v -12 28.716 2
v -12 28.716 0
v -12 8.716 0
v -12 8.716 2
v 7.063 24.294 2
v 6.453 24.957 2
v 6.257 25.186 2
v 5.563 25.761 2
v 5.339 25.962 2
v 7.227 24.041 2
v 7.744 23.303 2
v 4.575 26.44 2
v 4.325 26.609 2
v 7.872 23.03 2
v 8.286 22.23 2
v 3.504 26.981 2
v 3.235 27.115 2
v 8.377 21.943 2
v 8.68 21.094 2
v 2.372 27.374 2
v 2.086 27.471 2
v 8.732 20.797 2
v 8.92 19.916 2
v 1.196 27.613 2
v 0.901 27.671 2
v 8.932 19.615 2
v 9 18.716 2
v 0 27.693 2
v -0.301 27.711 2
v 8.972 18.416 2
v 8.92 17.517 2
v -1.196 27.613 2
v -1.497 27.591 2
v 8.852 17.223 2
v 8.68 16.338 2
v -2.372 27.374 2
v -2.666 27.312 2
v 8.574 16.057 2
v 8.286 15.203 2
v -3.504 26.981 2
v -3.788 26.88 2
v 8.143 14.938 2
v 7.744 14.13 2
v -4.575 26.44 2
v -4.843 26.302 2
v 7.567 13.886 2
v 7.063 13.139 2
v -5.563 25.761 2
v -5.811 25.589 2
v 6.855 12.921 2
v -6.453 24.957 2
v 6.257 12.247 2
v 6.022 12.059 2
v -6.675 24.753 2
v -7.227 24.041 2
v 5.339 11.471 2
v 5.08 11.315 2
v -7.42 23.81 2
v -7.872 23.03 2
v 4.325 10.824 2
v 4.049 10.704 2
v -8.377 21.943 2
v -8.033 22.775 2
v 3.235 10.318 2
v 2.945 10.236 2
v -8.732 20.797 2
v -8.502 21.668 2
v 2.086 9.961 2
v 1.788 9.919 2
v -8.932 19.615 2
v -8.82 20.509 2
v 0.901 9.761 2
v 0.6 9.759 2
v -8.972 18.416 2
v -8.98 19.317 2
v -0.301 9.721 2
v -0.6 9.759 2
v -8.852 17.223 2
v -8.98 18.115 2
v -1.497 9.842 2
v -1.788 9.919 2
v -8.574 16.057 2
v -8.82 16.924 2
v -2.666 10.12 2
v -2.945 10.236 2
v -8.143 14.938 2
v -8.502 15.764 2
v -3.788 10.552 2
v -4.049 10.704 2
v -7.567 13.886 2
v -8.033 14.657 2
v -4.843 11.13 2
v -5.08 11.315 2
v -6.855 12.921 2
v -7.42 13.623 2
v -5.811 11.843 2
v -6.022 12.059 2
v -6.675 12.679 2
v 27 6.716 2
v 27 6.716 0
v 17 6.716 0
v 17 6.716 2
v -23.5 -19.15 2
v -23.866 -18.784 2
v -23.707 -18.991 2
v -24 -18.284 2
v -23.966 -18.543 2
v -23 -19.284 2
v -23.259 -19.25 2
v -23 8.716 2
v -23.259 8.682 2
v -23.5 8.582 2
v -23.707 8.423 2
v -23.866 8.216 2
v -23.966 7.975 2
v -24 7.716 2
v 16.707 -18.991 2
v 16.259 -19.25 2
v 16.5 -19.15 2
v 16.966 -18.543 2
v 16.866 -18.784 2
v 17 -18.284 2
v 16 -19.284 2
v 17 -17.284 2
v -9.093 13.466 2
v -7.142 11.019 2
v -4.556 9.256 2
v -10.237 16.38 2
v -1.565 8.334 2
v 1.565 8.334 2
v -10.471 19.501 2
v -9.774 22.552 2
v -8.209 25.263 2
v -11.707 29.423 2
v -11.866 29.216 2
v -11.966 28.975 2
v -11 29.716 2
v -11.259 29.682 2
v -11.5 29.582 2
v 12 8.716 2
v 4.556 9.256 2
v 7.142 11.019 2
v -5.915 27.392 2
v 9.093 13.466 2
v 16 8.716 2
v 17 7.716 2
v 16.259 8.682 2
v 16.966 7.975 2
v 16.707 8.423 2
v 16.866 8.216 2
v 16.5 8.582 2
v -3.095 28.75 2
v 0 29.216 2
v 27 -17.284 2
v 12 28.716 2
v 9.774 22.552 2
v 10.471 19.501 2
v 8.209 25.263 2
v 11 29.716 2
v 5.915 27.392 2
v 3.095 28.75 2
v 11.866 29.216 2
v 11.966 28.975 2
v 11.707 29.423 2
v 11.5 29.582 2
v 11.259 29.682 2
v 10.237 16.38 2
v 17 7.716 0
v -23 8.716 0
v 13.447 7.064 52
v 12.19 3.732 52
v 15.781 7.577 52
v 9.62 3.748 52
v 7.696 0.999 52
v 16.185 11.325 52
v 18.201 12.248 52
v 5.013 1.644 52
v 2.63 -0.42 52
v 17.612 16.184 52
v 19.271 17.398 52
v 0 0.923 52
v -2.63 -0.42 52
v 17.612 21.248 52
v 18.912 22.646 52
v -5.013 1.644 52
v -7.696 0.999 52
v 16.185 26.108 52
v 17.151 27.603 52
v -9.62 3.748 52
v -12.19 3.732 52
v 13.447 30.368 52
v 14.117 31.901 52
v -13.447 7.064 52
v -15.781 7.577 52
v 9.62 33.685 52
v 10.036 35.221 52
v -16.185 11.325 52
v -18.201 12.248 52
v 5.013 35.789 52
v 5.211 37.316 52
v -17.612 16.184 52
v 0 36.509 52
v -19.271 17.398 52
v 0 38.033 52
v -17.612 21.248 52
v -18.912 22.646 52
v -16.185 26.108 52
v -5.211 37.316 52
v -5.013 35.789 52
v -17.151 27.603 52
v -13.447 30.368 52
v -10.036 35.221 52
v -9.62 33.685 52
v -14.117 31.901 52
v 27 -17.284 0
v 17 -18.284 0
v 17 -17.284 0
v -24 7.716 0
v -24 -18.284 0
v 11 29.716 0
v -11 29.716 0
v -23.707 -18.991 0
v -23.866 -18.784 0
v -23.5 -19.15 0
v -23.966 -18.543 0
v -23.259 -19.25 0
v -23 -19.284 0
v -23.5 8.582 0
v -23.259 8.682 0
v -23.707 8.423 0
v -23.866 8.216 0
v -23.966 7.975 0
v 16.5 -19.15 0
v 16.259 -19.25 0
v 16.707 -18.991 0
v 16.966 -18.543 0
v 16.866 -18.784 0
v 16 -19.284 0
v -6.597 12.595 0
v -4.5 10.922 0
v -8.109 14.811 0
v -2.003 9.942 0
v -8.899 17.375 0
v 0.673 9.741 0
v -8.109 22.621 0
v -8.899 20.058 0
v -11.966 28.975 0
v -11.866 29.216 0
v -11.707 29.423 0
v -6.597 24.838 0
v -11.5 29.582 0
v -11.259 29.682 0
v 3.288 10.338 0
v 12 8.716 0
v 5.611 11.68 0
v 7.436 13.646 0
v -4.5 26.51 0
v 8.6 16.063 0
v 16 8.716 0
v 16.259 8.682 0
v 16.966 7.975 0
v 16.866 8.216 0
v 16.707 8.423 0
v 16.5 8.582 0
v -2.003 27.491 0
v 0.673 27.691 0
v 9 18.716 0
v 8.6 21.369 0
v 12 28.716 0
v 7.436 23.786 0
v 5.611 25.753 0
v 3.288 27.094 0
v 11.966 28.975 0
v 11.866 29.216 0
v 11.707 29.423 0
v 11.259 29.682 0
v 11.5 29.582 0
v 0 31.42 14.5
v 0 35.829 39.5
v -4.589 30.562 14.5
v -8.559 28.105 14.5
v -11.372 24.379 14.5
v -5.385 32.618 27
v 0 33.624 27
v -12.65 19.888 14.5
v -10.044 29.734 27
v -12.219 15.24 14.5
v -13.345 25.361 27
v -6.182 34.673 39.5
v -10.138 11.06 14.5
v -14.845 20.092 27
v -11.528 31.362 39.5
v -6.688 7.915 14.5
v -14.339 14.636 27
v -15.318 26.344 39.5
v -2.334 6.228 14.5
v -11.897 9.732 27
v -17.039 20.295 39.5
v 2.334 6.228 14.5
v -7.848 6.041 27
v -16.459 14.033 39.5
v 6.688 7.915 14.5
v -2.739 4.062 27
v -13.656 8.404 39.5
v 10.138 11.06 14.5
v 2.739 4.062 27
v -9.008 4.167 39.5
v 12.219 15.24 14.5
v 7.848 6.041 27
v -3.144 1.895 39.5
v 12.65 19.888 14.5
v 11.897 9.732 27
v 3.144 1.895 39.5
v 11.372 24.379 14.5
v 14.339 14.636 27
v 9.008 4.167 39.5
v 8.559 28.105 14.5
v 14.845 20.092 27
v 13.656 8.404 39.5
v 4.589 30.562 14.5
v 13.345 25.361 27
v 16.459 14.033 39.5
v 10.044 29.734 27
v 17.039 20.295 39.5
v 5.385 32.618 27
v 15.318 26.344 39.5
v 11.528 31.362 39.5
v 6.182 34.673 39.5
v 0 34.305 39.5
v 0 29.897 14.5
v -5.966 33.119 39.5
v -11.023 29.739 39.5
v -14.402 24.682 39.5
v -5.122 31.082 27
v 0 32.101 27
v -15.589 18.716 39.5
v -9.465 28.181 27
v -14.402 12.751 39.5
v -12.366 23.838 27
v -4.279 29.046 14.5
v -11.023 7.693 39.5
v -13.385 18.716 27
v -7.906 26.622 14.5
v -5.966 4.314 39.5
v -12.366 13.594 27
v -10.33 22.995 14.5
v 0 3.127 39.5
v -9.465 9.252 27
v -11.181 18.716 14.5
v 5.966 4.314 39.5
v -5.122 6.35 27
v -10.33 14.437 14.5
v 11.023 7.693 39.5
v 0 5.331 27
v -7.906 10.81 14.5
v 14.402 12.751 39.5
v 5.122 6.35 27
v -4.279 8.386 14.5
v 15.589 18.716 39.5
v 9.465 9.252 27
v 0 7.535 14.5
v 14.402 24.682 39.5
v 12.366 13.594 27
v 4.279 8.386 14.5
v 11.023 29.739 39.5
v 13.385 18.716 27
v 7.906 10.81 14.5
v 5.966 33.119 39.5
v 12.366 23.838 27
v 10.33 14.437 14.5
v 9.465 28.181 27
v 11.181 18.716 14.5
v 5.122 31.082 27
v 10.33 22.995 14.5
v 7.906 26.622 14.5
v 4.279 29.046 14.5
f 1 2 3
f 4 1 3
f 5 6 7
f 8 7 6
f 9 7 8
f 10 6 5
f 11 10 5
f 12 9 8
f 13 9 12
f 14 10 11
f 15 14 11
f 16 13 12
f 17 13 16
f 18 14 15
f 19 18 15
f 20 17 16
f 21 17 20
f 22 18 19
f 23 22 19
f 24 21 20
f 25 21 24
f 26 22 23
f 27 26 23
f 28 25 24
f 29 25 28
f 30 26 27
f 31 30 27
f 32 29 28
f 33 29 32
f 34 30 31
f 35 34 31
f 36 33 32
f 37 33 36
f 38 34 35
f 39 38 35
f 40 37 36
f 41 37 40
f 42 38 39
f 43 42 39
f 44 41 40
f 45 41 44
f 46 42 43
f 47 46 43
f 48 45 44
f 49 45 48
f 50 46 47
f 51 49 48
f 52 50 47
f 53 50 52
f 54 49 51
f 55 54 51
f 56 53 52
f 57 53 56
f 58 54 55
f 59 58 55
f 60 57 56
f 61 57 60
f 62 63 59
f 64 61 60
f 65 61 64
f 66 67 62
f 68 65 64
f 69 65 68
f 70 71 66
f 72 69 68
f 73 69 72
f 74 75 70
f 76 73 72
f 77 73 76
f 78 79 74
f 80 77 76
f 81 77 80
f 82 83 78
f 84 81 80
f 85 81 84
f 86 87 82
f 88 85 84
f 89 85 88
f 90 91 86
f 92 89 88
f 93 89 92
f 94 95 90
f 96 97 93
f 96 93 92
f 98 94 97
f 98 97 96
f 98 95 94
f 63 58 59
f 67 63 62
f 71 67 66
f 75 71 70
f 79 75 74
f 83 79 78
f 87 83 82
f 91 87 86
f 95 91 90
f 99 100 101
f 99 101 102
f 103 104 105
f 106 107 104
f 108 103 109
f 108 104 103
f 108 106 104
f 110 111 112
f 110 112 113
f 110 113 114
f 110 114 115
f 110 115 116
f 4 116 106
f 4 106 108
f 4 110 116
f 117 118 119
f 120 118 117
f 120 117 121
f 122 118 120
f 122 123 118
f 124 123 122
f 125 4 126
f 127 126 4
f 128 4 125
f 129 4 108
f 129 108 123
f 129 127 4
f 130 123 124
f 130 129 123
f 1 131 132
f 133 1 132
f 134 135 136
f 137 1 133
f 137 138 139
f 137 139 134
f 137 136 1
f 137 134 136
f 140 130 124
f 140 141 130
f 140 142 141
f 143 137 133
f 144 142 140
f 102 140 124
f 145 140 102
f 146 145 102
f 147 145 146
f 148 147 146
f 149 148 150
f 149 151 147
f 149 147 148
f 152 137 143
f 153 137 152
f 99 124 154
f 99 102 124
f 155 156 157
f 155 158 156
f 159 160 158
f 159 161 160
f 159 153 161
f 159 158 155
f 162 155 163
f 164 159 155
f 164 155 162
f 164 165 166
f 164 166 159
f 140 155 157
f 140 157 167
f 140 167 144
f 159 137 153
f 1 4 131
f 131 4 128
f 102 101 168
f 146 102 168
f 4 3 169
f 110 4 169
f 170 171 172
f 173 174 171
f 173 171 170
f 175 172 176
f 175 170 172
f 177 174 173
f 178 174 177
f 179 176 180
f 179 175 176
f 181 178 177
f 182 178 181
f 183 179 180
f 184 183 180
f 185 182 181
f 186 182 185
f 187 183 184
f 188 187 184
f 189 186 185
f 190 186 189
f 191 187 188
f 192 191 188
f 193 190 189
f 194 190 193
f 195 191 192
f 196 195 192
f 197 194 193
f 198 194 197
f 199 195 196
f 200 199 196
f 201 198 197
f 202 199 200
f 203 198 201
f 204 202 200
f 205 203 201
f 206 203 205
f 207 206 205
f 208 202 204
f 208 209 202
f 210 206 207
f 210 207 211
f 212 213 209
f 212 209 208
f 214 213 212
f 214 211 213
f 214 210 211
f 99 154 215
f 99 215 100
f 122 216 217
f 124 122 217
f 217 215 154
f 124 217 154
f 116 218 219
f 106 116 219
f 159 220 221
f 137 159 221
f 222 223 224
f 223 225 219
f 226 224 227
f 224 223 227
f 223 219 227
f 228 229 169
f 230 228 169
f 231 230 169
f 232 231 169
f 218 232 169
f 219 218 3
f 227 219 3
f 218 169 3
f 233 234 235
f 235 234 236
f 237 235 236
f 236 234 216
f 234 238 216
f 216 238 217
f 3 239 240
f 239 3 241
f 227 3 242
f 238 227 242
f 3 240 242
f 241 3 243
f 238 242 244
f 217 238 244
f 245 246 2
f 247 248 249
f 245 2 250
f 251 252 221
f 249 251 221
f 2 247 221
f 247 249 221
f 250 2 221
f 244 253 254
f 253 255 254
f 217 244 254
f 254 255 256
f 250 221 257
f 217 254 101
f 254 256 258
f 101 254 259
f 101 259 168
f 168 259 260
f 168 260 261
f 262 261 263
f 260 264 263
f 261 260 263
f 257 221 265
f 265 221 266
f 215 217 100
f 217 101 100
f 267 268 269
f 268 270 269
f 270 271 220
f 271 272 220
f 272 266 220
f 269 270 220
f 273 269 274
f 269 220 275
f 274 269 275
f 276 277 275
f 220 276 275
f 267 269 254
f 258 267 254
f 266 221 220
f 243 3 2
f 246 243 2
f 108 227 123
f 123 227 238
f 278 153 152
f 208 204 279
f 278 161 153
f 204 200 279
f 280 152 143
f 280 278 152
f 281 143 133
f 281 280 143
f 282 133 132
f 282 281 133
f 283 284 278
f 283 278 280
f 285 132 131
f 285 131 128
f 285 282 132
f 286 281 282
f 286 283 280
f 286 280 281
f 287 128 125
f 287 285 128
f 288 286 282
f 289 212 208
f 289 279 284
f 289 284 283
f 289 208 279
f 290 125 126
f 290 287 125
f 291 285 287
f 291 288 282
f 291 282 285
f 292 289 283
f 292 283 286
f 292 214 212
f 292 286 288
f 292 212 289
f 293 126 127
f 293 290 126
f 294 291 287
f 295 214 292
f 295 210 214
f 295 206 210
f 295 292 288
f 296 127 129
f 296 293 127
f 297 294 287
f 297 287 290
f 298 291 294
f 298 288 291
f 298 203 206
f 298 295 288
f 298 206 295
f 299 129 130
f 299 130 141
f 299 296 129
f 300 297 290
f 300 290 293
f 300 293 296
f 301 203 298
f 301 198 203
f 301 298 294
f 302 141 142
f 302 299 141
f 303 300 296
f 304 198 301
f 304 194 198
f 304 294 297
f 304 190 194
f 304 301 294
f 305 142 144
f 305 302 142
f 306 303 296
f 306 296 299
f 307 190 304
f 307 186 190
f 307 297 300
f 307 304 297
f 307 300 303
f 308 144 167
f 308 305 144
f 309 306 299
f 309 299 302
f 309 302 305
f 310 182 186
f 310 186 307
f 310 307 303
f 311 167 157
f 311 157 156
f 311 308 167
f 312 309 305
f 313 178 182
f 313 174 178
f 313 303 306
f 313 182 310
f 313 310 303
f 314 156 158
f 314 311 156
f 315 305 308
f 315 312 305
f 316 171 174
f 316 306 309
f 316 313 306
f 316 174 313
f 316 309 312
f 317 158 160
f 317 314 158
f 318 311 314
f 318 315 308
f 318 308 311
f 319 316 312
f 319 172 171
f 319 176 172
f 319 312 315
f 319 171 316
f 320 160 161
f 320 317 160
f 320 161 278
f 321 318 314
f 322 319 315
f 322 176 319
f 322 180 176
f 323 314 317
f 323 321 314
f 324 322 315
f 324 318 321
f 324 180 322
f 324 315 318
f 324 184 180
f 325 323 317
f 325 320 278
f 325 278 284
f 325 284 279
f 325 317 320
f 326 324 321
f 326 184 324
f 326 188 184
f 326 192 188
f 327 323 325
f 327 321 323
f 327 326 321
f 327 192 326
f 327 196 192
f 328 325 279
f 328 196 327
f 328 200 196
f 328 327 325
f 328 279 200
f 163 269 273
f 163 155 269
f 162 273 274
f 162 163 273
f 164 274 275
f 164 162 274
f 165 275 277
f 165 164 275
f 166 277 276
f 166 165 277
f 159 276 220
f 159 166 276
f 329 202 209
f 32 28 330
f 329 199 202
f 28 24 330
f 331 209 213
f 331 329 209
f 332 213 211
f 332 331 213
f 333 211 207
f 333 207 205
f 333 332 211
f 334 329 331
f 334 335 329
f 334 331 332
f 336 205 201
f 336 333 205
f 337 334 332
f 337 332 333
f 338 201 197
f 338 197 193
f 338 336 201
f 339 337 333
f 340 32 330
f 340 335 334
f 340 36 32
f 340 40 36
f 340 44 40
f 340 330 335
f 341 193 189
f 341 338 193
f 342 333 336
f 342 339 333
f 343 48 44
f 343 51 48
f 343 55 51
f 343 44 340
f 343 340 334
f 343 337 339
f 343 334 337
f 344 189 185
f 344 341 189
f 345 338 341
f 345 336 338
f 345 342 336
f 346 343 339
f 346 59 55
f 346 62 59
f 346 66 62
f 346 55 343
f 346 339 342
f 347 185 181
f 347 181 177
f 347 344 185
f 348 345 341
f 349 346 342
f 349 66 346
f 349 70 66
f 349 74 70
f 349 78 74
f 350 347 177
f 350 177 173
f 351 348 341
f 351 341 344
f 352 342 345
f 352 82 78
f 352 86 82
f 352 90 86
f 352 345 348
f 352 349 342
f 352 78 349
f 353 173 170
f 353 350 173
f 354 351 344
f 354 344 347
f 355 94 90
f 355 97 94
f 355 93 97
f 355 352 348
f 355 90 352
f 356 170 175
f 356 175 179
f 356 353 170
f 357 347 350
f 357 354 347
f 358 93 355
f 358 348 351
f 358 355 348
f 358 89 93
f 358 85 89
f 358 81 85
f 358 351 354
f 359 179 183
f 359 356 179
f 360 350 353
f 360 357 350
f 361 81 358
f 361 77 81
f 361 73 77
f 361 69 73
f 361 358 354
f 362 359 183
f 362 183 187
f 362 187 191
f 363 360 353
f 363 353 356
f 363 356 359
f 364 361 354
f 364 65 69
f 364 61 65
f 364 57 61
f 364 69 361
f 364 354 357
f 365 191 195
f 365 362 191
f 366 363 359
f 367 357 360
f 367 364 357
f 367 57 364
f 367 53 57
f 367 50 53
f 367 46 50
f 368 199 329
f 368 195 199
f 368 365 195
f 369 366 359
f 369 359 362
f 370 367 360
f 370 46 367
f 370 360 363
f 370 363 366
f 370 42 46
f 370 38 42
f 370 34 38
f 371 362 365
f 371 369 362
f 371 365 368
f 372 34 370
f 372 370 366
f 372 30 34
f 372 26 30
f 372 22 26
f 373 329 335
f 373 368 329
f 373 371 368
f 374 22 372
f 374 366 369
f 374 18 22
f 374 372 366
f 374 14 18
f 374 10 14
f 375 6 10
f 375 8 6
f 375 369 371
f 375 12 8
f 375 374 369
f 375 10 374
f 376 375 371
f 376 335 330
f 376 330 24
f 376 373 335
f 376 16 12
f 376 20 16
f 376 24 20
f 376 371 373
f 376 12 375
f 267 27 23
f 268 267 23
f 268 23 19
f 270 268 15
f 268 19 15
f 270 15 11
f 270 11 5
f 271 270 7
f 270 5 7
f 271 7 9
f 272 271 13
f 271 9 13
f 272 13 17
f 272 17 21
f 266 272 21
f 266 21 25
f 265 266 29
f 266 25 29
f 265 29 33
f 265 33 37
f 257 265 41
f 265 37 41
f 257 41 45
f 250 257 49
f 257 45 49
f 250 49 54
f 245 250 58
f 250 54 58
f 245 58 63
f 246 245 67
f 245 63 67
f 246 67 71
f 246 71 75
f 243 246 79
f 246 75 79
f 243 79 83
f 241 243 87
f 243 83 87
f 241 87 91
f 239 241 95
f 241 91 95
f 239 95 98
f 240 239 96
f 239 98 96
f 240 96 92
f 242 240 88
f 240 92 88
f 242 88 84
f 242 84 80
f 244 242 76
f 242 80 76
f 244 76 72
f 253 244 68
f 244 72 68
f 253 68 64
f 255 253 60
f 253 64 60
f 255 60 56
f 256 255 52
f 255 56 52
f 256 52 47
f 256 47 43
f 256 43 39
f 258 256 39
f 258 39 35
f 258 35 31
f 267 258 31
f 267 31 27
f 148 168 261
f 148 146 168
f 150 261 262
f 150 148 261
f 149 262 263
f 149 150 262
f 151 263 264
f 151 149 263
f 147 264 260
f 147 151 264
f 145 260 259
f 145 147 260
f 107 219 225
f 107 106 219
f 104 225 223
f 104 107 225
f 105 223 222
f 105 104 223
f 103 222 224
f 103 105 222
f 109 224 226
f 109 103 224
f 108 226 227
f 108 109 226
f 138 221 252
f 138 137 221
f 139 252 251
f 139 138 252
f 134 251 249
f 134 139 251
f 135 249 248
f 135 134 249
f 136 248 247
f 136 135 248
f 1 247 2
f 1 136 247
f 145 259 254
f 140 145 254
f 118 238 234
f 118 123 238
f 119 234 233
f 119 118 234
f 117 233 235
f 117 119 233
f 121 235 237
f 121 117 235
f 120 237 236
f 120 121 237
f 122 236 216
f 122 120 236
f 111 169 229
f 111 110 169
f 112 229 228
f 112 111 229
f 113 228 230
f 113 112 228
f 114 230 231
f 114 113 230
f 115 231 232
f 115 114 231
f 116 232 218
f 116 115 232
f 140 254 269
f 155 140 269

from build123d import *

# Parameters (mm, degrees)
F1_DEPTH = 2
F2_R     = 1
F3_R     = 9
F4_DEPTH = 2
F8_W     = 24
F8_H     = 2
F9_DEPTH = 10


with BuildPart() as f1:
    # F0 (on Top) → F1 (new body)
    with BuildSketch(Plane.XY):
        Polygon((-12, 8.716256), (-24, 8.716256), (-24, -19.283744), (17, -19.283744), (17, 8.716256), (12, 8.716256), (12, 29.716256), (-12, 29.716256), align=None)
    extrude(amount=F1_DEPTH)

    # F2
    f2_edges = [f1.edges().sort_by_distance(p)[0] for p in [
        (-24, 8.716256, 1),
        (-12, 29.716256, 1),
        (12, 29.716256, 1),
        (17, 8.716256, 1),
        (17, -19.283744, 1),
        (-24, -19.283744, 1),
    ]]
    fillet(f2_edges, radius=F2_R)

    # F3 (on face) → F4 (cut, through all)
    with BuildSketch(Plane.XY.offset(2)):
        with Locations((0, 18.716256)):
            Circle(F3_R)
    extrude(amount=-F4_DEPTH, mode=Mode.SUBTRACT)

    # F5 (on Right) → F7 (revolve)
    with BuildSketch(Plane.YZ):
        Polygon((36.509466, 52), (27.693117, 2), (29.216256, 2), (38.032605, 52), align=None)
    revolve(axis=Axis((0, 18.716256, 10.515208), (0, 0, 1)))

    # F8 (on face) → F9 (join)
    with BuildSketch(Plane.YZ.offset(17)):
        with Locations((-5.283744, 1)):
            Rectangle(F8_W, F8_H)
    extrude(amount=F9_DEPTH)


solid = f1.part
